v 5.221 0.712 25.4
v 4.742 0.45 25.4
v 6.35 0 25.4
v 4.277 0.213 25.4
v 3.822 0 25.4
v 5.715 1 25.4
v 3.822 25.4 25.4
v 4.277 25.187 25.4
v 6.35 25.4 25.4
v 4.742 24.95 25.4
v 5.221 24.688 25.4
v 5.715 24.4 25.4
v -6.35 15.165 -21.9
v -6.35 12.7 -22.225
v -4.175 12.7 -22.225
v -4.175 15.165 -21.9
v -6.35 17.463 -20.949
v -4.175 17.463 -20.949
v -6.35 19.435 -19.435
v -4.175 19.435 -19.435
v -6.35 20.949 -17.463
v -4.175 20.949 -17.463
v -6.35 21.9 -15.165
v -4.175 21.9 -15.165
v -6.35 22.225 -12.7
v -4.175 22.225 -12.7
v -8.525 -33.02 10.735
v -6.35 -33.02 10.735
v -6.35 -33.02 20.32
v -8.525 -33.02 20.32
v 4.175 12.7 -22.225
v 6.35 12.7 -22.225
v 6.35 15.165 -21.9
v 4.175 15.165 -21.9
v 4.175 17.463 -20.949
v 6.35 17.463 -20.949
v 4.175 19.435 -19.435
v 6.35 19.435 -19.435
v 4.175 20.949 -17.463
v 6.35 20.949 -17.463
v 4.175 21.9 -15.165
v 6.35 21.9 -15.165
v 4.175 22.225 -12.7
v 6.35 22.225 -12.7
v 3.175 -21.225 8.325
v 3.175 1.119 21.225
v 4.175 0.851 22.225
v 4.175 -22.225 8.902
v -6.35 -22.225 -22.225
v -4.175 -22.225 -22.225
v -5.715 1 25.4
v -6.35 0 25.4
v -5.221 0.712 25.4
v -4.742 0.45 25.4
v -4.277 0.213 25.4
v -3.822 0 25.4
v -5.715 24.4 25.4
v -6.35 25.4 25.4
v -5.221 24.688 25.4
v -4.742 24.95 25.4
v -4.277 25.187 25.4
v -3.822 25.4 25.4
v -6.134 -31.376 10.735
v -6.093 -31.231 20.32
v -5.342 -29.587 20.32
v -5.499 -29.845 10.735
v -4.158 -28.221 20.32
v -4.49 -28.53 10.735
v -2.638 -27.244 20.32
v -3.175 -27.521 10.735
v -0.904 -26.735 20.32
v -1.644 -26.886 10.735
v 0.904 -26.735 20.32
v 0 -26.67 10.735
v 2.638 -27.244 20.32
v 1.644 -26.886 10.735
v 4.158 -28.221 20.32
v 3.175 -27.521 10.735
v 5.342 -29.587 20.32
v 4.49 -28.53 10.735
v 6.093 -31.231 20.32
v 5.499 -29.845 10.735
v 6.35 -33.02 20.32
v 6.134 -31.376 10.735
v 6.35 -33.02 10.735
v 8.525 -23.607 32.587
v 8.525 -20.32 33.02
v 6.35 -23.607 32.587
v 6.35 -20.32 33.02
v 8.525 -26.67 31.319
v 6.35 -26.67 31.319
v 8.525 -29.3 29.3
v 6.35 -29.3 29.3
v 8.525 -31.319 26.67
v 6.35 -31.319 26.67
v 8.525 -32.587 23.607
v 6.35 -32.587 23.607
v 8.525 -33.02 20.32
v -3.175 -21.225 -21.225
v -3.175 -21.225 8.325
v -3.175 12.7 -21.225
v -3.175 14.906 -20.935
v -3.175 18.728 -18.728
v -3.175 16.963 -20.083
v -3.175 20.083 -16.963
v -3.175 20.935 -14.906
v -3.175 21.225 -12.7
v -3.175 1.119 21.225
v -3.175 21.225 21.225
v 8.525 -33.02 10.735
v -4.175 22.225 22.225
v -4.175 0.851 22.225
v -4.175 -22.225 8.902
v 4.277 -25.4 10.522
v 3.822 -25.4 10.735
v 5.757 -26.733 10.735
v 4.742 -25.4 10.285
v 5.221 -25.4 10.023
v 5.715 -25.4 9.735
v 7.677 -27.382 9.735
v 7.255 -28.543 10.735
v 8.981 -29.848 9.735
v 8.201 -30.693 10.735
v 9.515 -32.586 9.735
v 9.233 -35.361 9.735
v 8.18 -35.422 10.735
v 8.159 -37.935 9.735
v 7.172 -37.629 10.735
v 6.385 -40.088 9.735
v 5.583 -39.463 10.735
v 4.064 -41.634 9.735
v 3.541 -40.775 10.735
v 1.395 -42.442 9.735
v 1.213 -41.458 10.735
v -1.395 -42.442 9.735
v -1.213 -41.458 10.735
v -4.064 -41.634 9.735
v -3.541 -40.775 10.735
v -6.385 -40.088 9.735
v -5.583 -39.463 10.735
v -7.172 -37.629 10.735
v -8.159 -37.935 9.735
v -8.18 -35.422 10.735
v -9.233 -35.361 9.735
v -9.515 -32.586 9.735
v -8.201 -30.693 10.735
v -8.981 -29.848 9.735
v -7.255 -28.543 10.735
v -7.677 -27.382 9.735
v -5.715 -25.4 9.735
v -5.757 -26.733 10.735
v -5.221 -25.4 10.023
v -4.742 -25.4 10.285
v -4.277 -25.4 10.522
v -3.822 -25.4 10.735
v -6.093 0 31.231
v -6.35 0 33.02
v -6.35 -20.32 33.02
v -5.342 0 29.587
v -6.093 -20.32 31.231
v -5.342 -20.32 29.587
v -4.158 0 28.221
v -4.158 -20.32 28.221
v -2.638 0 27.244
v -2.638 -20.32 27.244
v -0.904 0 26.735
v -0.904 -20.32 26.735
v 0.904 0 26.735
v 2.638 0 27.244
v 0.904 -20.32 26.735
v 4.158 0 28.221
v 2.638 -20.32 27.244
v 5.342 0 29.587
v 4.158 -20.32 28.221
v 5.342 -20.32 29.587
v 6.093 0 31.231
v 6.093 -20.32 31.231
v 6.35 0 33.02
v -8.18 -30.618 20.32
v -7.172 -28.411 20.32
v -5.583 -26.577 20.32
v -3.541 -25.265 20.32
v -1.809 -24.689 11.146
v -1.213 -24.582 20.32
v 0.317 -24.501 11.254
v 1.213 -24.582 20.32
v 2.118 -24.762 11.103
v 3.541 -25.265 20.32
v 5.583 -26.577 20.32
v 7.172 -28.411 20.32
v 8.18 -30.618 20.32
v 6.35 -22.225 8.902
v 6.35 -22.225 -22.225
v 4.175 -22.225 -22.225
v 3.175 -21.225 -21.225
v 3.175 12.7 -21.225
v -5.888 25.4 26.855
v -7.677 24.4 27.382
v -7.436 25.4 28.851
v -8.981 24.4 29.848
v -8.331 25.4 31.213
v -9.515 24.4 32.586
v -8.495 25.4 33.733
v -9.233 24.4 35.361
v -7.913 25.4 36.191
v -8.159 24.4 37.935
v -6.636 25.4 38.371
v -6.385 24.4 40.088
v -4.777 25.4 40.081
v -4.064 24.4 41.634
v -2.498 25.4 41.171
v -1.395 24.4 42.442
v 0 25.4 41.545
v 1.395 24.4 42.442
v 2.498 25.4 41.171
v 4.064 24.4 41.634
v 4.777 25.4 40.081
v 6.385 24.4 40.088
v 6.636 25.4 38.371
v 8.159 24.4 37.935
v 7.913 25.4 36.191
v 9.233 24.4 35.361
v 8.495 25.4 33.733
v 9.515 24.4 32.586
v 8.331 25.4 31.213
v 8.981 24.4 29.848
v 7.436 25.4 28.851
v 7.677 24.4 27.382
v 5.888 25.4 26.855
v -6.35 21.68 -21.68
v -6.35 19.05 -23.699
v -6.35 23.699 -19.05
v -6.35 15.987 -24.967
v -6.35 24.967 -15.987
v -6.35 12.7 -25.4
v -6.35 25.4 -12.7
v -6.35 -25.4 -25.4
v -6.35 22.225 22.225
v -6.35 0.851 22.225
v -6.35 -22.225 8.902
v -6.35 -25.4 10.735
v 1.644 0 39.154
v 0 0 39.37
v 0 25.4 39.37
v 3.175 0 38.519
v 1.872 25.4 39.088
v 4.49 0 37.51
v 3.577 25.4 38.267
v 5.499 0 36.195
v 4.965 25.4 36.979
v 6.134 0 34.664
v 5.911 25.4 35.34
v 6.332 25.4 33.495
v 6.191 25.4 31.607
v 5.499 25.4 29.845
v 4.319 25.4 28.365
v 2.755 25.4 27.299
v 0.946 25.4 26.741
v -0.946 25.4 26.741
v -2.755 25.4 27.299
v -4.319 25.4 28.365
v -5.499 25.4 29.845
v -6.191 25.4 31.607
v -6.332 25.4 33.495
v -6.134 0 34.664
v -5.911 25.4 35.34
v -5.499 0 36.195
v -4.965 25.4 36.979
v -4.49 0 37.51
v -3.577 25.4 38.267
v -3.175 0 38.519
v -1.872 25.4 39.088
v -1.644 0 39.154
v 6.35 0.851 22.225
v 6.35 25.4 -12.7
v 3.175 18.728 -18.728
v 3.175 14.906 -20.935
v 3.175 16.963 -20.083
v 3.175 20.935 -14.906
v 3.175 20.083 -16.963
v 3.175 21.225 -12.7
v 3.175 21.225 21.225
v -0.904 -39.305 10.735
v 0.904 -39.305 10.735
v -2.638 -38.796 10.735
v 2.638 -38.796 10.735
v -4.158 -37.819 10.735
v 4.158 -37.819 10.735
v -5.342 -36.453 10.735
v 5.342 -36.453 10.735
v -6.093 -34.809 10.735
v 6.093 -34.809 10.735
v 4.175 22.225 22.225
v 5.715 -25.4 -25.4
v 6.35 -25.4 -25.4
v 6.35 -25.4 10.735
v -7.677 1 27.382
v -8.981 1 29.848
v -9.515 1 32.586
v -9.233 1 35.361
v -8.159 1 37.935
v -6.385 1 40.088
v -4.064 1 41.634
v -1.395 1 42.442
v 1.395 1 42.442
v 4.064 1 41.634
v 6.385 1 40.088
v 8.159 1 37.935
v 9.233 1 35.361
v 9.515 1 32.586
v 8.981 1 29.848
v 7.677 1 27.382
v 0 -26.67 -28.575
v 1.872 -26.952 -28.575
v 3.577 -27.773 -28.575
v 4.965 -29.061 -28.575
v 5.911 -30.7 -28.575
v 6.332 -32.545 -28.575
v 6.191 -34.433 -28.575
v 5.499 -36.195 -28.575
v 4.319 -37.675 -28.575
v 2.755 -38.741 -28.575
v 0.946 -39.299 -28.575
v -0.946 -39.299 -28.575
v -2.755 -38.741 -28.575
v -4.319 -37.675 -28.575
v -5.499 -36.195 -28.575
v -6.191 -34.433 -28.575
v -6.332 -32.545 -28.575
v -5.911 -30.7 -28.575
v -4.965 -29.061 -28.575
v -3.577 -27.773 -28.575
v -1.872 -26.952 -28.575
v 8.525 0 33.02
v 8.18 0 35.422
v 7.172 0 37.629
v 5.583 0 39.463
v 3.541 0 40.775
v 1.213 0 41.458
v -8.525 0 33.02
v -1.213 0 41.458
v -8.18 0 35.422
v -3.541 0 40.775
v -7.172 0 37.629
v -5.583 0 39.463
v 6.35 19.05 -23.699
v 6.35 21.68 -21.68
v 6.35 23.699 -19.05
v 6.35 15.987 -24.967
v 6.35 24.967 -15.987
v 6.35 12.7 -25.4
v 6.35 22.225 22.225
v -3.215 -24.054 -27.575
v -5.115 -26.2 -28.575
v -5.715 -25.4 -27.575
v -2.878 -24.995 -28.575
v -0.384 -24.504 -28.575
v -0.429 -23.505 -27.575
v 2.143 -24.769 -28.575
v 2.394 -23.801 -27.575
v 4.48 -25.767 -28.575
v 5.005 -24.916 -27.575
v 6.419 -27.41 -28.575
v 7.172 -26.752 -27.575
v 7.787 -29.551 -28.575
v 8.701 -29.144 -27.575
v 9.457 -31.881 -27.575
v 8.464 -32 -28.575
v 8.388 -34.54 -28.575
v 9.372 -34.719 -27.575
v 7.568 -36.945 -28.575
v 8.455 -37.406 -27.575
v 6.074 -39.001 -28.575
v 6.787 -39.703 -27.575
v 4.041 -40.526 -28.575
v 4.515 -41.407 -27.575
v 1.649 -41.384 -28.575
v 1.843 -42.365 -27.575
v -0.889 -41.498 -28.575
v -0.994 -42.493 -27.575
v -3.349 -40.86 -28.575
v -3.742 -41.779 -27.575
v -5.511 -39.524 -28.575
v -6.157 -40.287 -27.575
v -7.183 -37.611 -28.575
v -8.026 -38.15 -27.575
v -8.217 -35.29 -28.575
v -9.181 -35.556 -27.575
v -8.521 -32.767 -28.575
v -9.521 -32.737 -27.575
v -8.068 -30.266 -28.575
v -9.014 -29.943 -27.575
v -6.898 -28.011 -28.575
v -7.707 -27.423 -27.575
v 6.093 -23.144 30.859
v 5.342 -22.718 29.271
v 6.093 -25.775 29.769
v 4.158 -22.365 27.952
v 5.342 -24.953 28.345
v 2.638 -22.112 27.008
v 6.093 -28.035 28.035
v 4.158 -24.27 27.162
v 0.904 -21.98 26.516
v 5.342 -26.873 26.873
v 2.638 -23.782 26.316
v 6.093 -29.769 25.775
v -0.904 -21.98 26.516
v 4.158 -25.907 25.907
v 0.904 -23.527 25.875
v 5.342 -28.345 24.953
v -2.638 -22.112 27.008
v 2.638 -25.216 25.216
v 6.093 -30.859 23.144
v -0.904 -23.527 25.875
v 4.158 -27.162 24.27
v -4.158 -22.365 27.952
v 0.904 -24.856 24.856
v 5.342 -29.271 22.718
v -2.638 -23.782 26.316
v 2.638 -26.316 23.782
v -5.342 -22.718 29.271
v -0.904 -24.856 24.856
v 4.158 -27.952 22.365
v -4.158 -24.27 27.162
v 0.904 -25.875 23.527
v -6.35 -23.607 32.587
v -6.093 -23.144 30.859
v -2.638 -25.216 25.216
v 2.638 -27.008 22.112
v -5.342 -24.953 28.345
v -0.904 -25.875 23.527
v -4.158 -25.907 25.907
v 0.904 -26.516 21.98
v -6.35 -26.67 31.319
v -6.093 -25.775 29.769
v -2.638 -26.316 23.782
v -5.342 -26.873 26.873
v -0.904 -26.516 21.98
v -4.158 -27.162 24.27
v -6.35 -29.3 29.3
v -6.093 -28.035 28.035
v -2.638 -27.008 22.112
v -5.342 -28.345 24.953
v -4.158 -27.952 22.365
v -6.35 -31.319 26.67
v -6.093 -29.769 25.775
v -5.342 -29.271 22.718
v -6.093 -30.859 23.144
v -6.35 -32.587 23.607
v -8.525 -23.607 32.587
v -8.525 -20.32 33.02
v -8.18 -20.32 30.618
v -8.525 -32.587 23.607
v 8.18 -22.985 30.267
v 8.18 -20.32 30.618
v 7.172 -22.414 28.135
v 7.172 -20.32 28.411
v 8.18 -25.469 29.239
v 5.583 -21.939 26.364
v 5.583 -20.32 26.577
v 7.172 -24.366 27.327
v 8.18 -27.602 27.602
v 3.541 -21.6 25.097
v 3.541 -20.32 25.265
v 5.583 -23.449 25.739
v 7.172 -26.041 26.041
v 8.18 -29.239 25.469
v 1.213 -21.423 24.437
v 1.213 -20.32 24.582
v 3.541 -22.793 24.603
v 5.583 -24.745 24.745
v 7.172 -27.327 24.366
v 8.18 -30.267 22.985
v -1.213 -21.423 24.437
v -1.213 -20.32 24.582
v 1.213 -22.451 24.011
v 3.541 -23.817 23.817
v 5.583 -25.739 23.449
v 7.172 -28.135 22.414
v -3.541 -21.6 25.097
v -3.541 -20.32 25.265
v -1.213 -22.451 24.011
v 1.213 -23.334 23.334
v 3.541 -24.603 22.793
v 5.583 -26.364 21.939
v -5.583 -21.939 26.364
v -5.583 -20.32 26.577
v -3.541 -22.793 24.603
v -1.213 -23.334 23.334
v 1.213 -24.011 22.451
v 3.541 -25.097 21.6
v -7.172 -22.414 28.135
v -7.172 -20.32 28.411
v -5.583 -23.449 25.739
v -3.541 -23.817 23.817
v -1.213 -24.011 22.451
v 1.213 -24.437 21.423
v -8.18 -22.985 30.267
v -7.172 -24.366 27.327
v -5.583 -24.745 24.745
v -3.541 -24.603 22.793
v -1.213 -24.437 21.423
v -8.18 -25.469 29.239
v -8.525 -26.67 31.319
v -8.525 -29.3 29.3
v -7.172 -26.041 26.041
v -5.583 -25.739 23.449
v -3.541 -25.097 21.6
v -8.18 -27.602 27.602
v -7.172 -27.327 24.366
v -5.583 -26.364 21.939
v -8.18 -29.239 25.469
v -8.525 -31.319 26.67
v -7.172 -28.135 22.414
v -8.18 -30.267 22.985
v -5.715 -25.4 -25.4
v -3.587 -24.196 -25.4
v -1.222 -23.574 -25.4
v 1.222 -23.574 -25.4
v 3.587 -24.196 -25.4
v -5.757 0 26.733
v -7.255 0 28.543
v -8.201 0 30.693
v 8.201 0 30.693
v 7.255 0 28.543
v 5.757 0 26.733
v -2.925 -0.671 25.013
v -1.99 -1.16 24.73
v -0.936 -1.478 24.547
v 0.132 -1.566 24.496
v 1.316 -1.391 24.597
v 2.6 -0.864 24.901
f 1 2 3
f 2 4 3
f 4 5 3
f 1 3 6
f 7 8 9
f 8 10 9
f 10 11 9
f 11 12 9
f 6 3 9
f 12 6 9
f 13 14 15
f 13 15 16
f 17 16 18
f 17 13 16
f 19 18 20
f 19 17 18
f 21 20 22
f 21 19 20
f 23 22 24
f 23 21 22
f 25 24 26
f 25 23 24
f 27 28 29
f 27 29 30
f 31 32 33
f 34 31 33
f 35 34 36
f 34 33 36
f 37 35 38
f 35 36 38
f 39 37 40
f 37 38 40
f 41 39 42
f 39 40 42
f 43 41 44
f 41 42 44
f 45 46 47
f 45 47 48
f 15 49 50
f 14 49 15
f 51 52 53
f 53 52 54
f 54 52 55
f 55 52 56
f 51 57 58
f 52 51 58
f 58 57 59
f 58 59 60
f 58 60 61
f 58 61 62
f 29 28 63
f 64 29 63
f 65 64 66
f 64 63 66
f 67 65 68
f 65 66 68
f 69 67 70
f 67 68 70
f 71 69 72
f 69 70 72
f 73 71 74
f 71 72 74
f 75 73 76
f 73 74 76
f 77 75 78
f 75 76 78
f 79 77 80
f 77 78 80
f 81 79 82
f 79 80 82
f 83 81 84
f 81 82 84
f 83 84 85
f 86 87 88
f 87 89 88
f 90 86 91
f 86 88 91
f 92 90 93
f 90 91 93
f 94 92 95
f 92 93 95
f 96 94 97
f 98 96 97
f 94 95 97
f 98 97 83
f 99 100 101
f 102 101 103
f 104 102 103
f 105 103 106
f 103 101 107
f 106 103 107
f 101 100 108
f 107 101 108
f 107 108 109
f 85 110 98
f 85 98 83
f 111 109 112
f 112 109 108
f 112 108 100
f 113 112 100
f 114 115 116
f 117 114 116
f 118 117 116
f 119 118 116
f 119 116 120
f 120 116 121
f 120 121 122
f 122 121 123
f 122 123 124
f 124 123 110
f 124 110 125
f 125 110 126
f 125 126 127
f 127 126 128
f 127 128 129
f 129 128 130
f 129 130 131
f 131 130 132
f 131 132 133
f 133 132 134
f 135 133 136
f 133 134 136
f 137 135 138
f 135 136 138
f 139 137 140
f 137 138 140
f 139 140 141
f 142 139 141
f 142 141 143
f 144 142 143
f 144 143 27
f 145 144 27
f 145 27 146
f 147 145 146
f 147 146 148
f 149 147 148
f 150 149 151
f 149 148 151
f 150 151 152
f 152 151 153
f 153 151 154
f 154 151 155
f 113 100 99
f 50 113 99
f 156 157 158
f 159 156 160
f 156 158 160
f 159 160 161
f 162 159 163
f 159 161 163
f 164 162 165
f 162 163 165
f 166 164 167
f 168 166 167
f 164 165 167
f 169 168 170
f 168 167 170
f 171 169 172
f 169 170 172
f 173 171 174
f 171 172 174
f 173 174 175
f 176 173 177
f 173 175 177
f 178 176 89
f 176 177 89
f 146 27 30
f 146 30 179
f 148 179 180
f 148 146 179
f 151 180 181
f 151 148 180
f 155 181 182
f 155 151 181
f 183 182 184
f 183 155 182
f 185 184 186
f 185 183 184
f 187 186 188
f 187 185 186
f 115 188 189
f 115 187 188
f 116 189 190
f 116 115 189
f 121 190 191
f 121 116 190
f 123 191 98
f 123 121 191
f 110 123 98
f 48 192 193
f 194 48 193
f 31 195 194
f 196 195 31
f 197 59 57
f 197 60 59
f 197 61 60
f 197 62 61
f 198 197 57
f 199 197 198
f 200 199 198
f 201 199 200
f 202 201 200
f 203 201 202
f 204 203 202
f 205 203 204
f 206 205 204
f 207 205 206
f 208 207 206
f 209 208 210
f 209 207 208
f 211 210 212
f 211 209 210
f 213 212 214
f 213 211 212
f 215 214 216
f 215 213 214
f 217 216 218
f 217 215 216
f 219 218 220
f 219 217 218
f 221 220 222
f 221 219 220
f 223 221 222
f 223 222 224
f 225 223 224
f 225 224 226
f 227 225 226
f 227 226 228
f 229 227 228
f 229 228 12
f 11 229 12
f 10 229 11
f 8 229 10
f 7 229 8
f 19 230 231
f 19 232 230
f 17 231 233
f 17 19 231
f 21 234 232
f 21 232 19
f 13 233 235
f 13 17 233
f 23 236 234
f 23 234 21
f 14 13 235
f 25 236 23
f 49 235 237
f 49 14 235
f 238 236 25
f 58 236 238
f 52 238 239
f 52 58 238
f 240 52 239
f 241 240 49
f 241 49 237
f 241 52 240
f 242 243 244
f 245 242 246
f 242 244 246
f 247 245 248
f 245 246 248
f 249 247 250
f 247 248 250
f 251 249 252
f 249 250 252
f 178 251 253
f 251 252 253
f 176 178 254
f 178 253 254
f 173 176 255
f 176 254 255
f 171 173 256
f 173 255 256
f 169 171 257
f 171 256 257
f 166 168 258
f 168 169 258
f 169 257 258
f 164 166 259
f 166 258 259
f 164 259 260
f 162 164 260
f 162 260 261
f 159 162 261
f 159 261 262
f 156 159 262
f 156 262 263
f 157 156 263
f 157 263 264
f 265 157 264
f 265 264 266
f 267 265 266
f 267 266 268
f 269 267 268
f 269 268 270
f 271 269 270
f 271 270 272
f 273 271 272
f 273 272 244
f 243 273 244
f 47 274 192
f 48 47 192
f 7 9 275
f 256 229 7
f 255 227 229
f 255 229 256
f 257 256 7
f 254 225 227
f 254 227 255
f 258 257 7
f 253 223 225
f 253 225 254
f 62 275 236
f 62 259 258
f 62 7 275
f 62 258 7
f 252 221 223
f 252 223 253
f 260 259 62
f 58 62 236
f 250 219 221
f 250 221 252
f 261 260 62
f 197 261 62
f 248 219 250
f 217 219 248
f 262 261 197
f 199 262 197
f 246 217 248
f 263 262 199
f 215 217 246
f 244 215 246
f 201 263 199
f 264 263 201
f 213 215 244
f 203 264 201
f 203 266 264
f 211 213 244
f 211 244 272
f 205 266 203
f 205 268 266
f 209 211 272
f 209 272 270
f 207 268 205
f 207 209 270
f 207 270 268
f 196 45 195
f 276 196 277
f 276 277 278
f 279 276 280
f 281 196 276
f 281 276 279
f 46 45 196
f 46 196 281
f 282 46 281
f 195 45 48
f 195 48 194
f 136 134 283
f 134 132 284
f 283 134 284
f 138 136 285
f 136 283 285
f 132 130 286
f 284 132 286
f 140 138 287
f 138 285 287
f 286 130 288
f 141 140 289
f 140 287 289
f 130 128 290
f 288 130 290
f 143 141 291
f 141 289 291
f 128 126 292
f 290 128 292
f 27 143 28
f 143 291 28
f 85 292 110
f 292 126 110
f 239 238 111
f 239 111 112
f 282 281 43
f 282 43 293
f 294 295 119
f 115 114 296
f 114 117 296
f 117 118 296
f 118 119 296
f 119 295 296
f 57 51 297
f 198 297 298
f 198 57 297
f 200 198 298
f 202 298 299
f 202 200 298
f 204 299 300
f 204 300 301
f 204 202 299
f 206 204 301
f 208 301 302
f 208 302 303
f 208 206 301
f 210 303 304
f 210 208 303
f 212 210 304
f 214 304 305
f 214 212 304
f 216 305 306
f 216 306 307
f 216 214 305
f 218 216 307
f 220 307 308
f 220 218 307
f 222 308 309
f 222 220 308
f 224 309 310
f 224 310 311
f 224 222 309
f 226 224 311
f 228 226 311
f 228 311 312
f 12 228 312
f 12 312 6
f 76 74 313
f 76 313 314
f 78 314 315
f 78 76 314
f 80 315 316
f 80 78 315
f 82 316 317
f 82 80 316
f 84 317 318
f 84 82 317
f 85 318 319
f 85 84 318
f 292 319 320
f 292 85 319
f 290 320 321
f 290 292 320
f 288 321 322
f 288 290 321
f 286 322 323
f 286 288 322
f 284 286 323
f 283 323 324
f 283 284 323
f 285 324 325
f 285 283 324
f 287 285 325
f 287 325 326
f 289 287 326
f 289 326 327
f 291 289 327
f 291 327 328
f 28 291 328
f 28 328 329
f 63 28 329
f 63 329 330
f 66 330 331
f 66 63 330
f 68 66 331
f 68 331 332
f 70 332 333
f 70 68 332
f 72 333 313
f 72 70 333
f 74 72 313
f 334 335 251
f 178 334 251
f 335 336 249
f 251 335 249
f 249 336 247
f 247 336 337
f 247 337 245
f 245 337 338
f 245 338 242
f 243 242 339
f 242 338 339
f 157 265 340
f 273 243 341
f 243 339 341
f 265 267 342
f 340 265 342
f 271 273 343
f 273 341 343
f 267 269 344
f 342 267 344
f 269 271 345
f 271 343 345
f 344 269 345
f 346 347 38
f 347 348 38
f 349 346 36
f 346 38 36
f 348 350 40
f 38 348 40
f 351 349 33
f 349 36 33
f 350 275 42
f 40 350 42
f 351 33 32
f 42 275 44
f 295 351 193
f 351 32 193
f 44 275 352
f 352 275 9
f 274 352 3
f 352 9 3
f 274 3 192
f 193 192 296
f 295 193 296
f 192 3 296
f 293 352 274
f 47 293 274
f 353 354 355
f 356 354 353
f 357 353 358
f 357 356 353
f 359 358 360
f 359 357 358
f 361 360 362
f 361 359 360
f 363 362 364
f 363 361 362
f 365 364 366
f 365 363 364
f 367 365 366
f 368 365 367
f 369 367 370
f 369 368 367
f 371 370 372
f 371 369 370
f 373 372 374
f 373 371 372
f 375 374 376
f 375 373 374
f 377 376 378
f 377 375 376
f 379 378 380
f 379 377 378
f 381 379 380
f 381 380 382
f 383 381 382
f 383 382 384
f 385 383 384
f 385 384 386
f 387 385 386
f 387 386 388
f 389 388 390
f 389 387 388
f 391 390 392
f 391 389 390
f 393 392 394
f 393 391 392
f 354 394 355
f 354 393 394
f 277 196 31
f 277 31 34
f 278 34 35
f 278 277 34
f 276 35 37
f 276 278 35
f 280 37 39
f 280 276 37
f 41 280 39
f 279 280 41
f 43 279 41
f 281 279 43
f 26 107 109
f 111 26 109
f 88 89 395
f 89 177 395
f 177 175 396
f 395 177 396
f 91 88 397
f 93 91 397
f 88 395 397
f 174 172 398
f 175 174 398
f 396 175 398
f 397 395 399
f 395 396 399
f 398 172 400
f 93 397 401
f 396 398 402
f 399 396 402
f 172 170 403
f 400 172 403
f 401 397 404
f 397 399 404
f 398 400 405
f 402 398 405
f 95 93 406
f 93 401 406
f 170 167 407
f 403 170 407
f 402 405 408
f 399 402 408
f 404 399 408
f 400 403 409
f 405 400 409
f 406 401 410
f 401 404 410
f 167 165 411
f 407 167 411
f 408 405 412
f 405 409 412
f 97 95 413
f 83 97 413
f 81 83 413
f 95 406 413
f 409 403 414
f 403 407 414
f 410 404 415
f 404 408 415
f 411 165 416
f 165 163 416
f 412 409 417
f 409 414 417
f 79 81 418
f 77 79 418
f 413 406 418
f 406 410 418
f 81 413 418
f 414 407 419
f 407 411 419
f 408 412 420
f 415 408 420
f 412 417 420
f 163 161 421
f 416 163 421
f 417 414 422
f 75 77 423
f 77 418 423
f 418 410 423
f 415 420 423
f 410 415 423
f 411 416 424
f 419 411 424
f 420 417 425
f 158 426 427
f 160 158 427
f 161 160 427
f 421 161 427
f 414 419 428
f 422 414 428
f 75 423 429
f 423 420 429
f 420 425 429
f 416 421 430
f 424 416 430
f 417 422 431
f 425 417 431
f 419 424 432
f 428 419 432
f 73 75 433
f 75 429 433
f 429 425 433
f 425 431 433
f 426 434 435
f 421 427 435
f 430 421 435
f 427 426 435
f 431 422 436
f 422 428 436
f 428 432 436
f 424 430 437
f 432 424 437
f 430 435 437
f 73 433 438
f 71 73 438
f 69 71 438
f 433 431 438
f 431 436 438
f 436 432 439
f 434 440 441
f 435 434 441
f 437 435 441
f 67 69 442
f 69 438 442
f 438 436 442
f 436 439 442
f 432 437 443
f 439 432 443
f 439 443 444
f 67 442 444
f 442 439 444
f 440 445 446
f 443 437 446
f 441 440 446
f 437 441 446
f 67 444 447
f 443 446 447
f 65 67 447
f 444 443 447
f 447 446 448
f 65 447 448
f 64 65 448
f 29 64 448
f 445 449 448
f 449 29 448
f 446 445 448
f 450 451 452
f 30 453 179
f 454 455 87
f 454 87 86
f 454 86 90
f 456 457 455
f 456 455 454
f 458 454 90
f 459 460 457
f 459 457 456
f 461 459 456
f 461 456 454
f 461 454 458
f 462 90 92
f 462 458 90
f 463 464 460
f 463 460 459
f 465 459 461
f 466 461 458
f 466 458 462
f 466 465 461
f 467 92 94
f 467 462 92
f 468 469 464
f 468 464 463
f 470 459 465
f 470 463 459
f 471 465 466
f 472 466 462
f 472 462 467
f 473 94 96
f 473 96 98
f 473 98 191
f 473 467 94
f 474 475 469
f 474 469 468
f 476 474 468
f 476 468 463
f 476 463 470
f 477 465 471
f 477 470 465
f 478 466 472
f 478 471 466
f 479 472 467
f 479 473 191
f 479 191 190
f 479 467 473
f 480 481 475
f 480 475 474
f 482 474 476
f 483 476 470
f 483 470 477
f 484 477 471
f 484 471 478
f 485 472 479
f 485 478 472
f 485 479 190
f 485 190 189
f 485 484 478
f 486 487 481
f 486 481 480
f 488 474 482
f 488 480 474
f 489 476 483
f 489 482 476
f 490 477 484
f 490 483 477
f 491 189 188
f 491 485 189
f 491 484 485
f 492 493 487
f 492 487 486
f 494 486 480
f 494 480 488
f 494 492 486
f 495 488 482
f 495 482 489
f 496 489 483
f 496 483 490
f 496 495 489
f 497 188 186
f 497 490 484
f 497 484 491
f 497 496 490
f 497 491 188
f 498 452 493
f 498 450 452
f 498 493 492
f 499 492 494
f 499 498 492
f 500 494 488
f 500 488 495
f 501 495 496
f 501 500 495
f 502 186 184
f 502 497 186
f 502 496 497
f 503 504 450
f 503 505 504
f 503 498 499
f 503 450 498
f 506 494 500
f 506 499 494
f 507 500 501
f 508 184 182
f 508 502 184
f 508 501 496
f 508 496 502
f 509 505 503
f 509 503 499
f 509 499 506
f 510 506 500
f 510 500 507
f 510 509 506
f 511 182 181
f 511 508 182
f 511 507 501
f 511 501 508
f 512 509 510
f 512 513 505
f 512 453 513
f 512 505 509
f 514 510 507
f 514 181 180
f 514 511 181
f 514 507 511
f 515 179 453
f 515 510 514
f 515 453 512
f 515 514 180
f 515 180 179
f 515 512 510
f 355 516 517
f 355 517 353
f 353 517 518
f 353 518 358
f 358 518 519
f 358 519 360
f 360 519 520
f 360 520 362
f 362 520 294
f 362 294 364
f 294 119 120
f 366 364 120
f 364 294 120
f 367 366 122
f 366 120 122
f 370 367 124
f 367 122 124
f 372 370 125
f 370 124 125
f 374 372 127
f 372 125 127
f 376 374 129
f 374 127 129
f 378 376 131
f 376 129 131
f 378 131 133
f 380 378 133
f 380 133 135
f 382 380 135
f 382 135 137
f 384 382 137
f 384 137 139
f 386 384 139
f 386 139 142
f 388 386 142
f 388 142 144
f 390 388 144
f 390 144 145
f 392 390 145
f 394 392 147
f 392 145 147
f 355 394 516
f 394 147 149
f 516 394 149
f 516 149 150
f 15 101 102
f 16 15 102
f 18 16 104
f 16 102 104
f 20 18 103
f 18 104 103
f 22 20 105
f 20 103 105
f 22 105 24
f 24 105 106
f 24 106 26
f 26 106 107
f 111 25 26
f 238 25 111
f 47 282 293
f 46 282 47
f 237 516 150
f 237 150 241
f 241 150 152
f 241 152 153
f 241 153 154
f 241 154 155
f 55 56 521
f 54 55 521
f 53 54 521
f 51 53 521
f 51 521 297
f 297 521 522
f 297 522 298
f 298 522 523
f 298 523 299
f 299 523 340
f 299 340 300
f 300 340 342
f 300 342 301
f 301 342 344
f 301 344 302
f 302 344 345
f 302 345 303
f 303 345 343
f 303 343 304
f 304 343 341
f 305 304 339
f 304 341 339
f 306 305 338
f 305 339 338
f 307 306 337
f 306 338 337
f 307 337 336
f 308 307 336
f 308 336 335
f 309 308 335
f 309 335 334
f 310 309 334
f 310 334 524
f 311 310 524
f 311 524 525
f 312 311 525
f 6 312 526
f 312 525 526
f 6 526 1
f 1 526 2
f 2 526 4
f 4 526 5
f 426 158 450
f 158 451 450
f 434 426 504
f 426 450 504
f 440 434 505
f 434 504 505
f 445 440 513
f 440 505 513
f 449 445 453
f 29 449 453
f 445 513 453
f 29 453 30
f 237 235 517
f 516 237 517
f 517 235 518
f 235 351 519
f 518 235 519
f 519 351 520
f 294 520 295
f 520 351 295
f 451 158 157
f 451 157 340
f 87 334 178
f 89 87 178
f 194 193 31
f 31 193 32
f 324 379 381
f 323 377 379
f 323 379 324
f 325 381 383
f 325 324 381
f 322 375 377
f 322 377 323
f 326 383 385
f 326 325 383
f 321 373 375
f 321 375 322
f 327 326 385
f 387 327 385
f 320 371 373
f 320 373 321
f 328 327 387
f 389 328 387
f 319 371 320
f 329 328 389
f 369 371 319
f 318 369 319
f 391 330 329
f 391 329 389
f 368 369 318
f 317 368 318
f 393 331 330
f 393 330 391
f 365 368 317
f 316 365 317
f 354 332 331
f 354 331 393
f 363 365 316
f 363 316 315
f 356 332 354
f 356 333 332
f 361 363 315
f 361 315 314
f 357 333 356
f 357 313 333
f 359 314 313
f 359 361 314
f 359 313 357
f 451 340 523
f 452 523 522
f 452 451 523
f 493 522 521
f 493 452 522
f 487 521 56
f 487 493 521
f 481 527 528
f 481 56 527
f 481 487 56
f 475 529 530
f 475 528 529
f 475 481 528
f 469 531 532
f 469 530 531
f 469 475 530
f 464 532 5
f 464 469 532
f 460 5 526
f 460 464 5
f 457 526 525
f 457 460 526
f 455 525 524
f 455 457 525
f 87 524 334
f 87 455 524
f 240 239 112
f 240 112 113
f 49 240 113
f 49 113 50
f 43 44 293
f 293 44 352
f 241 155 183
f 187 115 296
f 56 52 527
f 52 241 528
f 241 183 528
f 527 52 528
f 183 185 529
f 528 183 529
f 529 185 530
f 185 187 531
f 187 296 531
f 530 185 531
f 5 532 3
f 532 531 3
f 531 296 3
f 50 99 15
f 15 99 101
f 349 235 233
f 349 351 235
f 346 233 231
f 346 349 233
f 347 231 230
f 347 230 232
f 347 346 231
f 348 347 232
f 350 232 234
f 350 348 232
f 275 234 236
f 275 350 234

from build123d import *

# Parameters (mm, degrees)
BOSS_EXTRUDE1_DEPTH      = 6.35
FILLET1_R                = 12.7
CUT_EXTRUDE2_DEPTH       = 3.175
BOSS_EXTRUDE2_DEPTH      = 3.175
BOSS_EXTRUDE2_DEPTH_BACK = 36.135303
SKETCH4_R                = 9.525
SKETCH4_R_2              = 6.35
SKETCH5_R                = 9.525
SKETCH5_R_2              = 6.35
BOSS_EXTRUDE3_DEPTH      = 25.4
CHAMFER2_SIZE            = 1
CHAMFER4_SIZE            = 1


with BuildPart() as part:
    # Sketch1 → Boss-Extrude1 (new, symmetric)
    with BuildSketch(Plane.YZ):
        Polygon((-25.4, 10.735303163), (0, 25.4), (25.4, 25.4), (25.4, -25.4), (-25.4, -25.4), align=None)
    extrude(amount=BOSS_EXTRUDE1_DEPTH, both=True)

    # Fillet1
    fillet1_edges = [part.edges().sort_by_distance(p)[0] for p in [
        (0, 25.4, -25.4),
    ]]
    fillet(fillet1_edges, radius=FILLET1_R)

    # Sketch3 → Cut-Extrude2 (cut)
    with BuildSketch(Plane.YZ.offset(6.35)):
        with BuildLine():
            Line((-22.225, -22.225), (12.7, -22.225))
            ThreePointArc((12.7, -22.225), (19.435192091, -19.435192091), (22.225, -12.7))
            Line((22.225, -12.7), (22.225, 22.225))
            Line((22.225, 22.225), (0.850738686, 22.225))
            Line((0.850738686, 22.225), (-22.225, 8.902216058))
            Line((-22.225, 8.902216058), (-22.225, -22.225))
        make_face()
    cut_extrude2 = extrude(amount=-CUT_EXTRUDE2_DEPTH, mode=Mode.SUBTRACT)

    # Mirror1: Cut-Extrude2 across plane
    add(cut_extrude2.mirror(Plane(origin=(0, 0, 0), x_dir=(0, 0, 1), z_dir=(1, 0, 0))), mode=Mode.SUBTRACT)

    # Sketch4 → Boss-Extrude2 (add, two sides: drawn at the far end of the back side and taken through both)
    with BuildSketch(Plane(origin=(0, 0, -25.4), x_dir=(1, 0, 0), z_dir=(0, 0, -1)).offset(-BOSS_EXTRUDE2_DEPTH_BACK)):
        with Locations(Location((0, 33.02, 0), (0, 0, 233.130102354))):
            Circle(SKETCH4_R)
        with Locations(Location((0, 33.02, 0), (0, 0, 270))):
            Circle(SKETCH4_R_2, mode=Mode.SUBTRACT)
    extrude(amount=BOSS_EXTRUDE2_DEPTH + BOSS_EXTRUDE2_DEPTH_BACK)

    # Sketch5 → Boss-Extrude3 (add)
    with BuildSketch(Plane(origin=(0, 25.4, 0), x_dir=(-1, 0, 0), z_dir=(0, 1, 0))):
        with Locations((0, 33.02)):
            Circle(SKETCH5_R)
        with Locations(Location((0, 33.02, 0), (0, 0, 90))):
            Circle(SKETCH5_R_2, mode=Mode.SUBTRACT)
    extrude(amount=-BOSS_EXTRUDE3_DEPTH)

    # Chamfer2
    # the kernel refuses this chamfer: 1 mm, written as the material it takes off along each edge
    with BuildSketch(Plane(origin=(0, -33.02, 10.735303), x_dir=(0.3638595085405839, 0.931453841070294, 0), z_dir=(-0.931453841070294, 0.3638595085405839, 0))) as chamfer2_piece_1_section:
        Polygon((9.525, CHAMFER2_SIZE), (9.525 - CHAMFER2_SIZE, 0), (9.525, 0), align=None)
    chamfer2_piece_1 = revolve(axis=Axis((0, -33.02, 10.735303), (0, 0, -1)), revolution_arc=317.325176487, mode=Mode.PRIVATE)
    chamfer2_piece_1 = split(chamfer2_piece_1, bisect_by=Plane(origin=(5.777045626, -25.4, 10.24862198), z_dir=(0, -1, 0)), keep=Keep.TOP, mode=Mode.PRIVATE)
    add(chamfer2_piece_1, mode=Mode.SUBTRACT)
    with BuildSketch(Plane(origin=(0, -33.02, -28.575), x_dir=(-0.6000000000021781, 0.7999999999983665, 0), z_dir=(-0.7999999999983665, -0.6000000000021781, 0))) as chamfer2_piece_2:
        Polygon((9.525, -CHAMFER2_SIZE), (9.525 - CHAMFER2_SIZE, 0), (9.525, 0), align=None)
    revolve(axis=Axis((0, -33.02, -28.575), (0, 0, -1)), mode=Mode.SUBTRACT)
    with BuildSketch(Plane(origin=(0, 25.4, 33.02), x_dir=(-0.3638595085405501, 0, -0.9314538410703074), z_dir=(0.9314538410703074, 0, -0.3638595085405501))) as chamfer2_piece_3_section:
        Polygon((9.525, -CHAMFER2_SIZE), (9.525 - CHAMFER2_SIZE, 0), (9.525, 0), align=None)
    chamfer2_piece_3 = revolve(axis=Axis((0, 25.4, 33.02), (0, 1, 0)), revolution_arc=317.325176487, mode=Mode.PRIVATE)
    chamfer2_piece_3 = split(chamfer2_piece_3, bisect_by=Plane(origin=(0, 24.920234358, 25.4), z_dir=(0, 0, 1)), keep=Keep.TOP, mode=Mode.PRIVATE)
    add(chamfer2_piece_3, mode=Mode.SUBTRACT)
    with BuildSketch(Plane(origin=(0, 0, 33.02), x_dir=(-0.3638595085405531, 0, -0.9314538410703063), z_dir=(0.9314538410703063, 0, -0.3638595085405531))) as chamfer2_piece_4_section:
        Polygon((9.525, CHAMFER2_SIZE), (9.525 - CHAMFER2_SIZE, 0), (9.525, 0), align=None)
    chamfer2_piece_4 = revolve(axis=Axis((0, 0, 33.02), (0, 1, 0)), revolution_arc=317.325176487, mode=Mode.PRIVATE)
    chamfer2_piece_4 = split(chamfer2_piece_4, bisect_by=Plane(origin=(-5.452412952, 0.490850729, 25.4), z_dir=(0, 0, 1)), keep=Keep.TOP, mode=Mode.PRIVATE)
    add(chamfer2_piece_4, mode=Mode.SUBTRACT)

    # Sweep3: sweep along a path in Sketch6
    with BuildLine(Plane.YZ) as sweep3_path:
        Line((0, 33.02), (-20.32, 33.02))
        ThreePointArc((-20.32, 33.02), (-29.300256121, 29.300256121), (-33.02, 20.32))
        Line((-33.02, 20.32), (-33.02, 10.735303163))
    # Sketch7 → Sweep3 (sweep)
    with BuildSketch(Plane.XZ):
        with BuildLine():
            Line((-8.525, 33.02), (-6.35, 33.02))
            ThreePointArc((-6.35, 33.02), (0, 26.67), (6.35, 33.02))
            Line((6.35, 33.02), (8.525, 33.02))
            ThreePointArc((8.525, 33.02), (0, 24.495), (-8.525, 33.02))
        make_face()
    sweep(path=sweep3_path.line)

    # Chamfer4
    chamfer4_edges = [part.edges().sort_by_distance(p)[0] for p in [
        (3.175, -22.225, -6.661391971),
        (3.175, -10.687130657, 15.563608029),
        (3.175, 11.537869343, 22.225),
        (3.175, 22.225, 4.7625),
        (3.175, 19.435192091, -19.435192091),
        (3.175, -4.7625, -22.225),
        (-3.175, -22.225, -6.661391971),
        (-3.175, -4.7625, -22.225),
        (-3.175, 19.435192091, -19.435192091),
        (-3.175, 22.225, 4.7625),
        (-3.175, 11.537869343, 22.225),
        (-3.175, -10.687130657, 15.563608029),
    ]]
    chamfer(chamfer4_edges, length=CHAMFER4_SIZE)


solid = part.part
